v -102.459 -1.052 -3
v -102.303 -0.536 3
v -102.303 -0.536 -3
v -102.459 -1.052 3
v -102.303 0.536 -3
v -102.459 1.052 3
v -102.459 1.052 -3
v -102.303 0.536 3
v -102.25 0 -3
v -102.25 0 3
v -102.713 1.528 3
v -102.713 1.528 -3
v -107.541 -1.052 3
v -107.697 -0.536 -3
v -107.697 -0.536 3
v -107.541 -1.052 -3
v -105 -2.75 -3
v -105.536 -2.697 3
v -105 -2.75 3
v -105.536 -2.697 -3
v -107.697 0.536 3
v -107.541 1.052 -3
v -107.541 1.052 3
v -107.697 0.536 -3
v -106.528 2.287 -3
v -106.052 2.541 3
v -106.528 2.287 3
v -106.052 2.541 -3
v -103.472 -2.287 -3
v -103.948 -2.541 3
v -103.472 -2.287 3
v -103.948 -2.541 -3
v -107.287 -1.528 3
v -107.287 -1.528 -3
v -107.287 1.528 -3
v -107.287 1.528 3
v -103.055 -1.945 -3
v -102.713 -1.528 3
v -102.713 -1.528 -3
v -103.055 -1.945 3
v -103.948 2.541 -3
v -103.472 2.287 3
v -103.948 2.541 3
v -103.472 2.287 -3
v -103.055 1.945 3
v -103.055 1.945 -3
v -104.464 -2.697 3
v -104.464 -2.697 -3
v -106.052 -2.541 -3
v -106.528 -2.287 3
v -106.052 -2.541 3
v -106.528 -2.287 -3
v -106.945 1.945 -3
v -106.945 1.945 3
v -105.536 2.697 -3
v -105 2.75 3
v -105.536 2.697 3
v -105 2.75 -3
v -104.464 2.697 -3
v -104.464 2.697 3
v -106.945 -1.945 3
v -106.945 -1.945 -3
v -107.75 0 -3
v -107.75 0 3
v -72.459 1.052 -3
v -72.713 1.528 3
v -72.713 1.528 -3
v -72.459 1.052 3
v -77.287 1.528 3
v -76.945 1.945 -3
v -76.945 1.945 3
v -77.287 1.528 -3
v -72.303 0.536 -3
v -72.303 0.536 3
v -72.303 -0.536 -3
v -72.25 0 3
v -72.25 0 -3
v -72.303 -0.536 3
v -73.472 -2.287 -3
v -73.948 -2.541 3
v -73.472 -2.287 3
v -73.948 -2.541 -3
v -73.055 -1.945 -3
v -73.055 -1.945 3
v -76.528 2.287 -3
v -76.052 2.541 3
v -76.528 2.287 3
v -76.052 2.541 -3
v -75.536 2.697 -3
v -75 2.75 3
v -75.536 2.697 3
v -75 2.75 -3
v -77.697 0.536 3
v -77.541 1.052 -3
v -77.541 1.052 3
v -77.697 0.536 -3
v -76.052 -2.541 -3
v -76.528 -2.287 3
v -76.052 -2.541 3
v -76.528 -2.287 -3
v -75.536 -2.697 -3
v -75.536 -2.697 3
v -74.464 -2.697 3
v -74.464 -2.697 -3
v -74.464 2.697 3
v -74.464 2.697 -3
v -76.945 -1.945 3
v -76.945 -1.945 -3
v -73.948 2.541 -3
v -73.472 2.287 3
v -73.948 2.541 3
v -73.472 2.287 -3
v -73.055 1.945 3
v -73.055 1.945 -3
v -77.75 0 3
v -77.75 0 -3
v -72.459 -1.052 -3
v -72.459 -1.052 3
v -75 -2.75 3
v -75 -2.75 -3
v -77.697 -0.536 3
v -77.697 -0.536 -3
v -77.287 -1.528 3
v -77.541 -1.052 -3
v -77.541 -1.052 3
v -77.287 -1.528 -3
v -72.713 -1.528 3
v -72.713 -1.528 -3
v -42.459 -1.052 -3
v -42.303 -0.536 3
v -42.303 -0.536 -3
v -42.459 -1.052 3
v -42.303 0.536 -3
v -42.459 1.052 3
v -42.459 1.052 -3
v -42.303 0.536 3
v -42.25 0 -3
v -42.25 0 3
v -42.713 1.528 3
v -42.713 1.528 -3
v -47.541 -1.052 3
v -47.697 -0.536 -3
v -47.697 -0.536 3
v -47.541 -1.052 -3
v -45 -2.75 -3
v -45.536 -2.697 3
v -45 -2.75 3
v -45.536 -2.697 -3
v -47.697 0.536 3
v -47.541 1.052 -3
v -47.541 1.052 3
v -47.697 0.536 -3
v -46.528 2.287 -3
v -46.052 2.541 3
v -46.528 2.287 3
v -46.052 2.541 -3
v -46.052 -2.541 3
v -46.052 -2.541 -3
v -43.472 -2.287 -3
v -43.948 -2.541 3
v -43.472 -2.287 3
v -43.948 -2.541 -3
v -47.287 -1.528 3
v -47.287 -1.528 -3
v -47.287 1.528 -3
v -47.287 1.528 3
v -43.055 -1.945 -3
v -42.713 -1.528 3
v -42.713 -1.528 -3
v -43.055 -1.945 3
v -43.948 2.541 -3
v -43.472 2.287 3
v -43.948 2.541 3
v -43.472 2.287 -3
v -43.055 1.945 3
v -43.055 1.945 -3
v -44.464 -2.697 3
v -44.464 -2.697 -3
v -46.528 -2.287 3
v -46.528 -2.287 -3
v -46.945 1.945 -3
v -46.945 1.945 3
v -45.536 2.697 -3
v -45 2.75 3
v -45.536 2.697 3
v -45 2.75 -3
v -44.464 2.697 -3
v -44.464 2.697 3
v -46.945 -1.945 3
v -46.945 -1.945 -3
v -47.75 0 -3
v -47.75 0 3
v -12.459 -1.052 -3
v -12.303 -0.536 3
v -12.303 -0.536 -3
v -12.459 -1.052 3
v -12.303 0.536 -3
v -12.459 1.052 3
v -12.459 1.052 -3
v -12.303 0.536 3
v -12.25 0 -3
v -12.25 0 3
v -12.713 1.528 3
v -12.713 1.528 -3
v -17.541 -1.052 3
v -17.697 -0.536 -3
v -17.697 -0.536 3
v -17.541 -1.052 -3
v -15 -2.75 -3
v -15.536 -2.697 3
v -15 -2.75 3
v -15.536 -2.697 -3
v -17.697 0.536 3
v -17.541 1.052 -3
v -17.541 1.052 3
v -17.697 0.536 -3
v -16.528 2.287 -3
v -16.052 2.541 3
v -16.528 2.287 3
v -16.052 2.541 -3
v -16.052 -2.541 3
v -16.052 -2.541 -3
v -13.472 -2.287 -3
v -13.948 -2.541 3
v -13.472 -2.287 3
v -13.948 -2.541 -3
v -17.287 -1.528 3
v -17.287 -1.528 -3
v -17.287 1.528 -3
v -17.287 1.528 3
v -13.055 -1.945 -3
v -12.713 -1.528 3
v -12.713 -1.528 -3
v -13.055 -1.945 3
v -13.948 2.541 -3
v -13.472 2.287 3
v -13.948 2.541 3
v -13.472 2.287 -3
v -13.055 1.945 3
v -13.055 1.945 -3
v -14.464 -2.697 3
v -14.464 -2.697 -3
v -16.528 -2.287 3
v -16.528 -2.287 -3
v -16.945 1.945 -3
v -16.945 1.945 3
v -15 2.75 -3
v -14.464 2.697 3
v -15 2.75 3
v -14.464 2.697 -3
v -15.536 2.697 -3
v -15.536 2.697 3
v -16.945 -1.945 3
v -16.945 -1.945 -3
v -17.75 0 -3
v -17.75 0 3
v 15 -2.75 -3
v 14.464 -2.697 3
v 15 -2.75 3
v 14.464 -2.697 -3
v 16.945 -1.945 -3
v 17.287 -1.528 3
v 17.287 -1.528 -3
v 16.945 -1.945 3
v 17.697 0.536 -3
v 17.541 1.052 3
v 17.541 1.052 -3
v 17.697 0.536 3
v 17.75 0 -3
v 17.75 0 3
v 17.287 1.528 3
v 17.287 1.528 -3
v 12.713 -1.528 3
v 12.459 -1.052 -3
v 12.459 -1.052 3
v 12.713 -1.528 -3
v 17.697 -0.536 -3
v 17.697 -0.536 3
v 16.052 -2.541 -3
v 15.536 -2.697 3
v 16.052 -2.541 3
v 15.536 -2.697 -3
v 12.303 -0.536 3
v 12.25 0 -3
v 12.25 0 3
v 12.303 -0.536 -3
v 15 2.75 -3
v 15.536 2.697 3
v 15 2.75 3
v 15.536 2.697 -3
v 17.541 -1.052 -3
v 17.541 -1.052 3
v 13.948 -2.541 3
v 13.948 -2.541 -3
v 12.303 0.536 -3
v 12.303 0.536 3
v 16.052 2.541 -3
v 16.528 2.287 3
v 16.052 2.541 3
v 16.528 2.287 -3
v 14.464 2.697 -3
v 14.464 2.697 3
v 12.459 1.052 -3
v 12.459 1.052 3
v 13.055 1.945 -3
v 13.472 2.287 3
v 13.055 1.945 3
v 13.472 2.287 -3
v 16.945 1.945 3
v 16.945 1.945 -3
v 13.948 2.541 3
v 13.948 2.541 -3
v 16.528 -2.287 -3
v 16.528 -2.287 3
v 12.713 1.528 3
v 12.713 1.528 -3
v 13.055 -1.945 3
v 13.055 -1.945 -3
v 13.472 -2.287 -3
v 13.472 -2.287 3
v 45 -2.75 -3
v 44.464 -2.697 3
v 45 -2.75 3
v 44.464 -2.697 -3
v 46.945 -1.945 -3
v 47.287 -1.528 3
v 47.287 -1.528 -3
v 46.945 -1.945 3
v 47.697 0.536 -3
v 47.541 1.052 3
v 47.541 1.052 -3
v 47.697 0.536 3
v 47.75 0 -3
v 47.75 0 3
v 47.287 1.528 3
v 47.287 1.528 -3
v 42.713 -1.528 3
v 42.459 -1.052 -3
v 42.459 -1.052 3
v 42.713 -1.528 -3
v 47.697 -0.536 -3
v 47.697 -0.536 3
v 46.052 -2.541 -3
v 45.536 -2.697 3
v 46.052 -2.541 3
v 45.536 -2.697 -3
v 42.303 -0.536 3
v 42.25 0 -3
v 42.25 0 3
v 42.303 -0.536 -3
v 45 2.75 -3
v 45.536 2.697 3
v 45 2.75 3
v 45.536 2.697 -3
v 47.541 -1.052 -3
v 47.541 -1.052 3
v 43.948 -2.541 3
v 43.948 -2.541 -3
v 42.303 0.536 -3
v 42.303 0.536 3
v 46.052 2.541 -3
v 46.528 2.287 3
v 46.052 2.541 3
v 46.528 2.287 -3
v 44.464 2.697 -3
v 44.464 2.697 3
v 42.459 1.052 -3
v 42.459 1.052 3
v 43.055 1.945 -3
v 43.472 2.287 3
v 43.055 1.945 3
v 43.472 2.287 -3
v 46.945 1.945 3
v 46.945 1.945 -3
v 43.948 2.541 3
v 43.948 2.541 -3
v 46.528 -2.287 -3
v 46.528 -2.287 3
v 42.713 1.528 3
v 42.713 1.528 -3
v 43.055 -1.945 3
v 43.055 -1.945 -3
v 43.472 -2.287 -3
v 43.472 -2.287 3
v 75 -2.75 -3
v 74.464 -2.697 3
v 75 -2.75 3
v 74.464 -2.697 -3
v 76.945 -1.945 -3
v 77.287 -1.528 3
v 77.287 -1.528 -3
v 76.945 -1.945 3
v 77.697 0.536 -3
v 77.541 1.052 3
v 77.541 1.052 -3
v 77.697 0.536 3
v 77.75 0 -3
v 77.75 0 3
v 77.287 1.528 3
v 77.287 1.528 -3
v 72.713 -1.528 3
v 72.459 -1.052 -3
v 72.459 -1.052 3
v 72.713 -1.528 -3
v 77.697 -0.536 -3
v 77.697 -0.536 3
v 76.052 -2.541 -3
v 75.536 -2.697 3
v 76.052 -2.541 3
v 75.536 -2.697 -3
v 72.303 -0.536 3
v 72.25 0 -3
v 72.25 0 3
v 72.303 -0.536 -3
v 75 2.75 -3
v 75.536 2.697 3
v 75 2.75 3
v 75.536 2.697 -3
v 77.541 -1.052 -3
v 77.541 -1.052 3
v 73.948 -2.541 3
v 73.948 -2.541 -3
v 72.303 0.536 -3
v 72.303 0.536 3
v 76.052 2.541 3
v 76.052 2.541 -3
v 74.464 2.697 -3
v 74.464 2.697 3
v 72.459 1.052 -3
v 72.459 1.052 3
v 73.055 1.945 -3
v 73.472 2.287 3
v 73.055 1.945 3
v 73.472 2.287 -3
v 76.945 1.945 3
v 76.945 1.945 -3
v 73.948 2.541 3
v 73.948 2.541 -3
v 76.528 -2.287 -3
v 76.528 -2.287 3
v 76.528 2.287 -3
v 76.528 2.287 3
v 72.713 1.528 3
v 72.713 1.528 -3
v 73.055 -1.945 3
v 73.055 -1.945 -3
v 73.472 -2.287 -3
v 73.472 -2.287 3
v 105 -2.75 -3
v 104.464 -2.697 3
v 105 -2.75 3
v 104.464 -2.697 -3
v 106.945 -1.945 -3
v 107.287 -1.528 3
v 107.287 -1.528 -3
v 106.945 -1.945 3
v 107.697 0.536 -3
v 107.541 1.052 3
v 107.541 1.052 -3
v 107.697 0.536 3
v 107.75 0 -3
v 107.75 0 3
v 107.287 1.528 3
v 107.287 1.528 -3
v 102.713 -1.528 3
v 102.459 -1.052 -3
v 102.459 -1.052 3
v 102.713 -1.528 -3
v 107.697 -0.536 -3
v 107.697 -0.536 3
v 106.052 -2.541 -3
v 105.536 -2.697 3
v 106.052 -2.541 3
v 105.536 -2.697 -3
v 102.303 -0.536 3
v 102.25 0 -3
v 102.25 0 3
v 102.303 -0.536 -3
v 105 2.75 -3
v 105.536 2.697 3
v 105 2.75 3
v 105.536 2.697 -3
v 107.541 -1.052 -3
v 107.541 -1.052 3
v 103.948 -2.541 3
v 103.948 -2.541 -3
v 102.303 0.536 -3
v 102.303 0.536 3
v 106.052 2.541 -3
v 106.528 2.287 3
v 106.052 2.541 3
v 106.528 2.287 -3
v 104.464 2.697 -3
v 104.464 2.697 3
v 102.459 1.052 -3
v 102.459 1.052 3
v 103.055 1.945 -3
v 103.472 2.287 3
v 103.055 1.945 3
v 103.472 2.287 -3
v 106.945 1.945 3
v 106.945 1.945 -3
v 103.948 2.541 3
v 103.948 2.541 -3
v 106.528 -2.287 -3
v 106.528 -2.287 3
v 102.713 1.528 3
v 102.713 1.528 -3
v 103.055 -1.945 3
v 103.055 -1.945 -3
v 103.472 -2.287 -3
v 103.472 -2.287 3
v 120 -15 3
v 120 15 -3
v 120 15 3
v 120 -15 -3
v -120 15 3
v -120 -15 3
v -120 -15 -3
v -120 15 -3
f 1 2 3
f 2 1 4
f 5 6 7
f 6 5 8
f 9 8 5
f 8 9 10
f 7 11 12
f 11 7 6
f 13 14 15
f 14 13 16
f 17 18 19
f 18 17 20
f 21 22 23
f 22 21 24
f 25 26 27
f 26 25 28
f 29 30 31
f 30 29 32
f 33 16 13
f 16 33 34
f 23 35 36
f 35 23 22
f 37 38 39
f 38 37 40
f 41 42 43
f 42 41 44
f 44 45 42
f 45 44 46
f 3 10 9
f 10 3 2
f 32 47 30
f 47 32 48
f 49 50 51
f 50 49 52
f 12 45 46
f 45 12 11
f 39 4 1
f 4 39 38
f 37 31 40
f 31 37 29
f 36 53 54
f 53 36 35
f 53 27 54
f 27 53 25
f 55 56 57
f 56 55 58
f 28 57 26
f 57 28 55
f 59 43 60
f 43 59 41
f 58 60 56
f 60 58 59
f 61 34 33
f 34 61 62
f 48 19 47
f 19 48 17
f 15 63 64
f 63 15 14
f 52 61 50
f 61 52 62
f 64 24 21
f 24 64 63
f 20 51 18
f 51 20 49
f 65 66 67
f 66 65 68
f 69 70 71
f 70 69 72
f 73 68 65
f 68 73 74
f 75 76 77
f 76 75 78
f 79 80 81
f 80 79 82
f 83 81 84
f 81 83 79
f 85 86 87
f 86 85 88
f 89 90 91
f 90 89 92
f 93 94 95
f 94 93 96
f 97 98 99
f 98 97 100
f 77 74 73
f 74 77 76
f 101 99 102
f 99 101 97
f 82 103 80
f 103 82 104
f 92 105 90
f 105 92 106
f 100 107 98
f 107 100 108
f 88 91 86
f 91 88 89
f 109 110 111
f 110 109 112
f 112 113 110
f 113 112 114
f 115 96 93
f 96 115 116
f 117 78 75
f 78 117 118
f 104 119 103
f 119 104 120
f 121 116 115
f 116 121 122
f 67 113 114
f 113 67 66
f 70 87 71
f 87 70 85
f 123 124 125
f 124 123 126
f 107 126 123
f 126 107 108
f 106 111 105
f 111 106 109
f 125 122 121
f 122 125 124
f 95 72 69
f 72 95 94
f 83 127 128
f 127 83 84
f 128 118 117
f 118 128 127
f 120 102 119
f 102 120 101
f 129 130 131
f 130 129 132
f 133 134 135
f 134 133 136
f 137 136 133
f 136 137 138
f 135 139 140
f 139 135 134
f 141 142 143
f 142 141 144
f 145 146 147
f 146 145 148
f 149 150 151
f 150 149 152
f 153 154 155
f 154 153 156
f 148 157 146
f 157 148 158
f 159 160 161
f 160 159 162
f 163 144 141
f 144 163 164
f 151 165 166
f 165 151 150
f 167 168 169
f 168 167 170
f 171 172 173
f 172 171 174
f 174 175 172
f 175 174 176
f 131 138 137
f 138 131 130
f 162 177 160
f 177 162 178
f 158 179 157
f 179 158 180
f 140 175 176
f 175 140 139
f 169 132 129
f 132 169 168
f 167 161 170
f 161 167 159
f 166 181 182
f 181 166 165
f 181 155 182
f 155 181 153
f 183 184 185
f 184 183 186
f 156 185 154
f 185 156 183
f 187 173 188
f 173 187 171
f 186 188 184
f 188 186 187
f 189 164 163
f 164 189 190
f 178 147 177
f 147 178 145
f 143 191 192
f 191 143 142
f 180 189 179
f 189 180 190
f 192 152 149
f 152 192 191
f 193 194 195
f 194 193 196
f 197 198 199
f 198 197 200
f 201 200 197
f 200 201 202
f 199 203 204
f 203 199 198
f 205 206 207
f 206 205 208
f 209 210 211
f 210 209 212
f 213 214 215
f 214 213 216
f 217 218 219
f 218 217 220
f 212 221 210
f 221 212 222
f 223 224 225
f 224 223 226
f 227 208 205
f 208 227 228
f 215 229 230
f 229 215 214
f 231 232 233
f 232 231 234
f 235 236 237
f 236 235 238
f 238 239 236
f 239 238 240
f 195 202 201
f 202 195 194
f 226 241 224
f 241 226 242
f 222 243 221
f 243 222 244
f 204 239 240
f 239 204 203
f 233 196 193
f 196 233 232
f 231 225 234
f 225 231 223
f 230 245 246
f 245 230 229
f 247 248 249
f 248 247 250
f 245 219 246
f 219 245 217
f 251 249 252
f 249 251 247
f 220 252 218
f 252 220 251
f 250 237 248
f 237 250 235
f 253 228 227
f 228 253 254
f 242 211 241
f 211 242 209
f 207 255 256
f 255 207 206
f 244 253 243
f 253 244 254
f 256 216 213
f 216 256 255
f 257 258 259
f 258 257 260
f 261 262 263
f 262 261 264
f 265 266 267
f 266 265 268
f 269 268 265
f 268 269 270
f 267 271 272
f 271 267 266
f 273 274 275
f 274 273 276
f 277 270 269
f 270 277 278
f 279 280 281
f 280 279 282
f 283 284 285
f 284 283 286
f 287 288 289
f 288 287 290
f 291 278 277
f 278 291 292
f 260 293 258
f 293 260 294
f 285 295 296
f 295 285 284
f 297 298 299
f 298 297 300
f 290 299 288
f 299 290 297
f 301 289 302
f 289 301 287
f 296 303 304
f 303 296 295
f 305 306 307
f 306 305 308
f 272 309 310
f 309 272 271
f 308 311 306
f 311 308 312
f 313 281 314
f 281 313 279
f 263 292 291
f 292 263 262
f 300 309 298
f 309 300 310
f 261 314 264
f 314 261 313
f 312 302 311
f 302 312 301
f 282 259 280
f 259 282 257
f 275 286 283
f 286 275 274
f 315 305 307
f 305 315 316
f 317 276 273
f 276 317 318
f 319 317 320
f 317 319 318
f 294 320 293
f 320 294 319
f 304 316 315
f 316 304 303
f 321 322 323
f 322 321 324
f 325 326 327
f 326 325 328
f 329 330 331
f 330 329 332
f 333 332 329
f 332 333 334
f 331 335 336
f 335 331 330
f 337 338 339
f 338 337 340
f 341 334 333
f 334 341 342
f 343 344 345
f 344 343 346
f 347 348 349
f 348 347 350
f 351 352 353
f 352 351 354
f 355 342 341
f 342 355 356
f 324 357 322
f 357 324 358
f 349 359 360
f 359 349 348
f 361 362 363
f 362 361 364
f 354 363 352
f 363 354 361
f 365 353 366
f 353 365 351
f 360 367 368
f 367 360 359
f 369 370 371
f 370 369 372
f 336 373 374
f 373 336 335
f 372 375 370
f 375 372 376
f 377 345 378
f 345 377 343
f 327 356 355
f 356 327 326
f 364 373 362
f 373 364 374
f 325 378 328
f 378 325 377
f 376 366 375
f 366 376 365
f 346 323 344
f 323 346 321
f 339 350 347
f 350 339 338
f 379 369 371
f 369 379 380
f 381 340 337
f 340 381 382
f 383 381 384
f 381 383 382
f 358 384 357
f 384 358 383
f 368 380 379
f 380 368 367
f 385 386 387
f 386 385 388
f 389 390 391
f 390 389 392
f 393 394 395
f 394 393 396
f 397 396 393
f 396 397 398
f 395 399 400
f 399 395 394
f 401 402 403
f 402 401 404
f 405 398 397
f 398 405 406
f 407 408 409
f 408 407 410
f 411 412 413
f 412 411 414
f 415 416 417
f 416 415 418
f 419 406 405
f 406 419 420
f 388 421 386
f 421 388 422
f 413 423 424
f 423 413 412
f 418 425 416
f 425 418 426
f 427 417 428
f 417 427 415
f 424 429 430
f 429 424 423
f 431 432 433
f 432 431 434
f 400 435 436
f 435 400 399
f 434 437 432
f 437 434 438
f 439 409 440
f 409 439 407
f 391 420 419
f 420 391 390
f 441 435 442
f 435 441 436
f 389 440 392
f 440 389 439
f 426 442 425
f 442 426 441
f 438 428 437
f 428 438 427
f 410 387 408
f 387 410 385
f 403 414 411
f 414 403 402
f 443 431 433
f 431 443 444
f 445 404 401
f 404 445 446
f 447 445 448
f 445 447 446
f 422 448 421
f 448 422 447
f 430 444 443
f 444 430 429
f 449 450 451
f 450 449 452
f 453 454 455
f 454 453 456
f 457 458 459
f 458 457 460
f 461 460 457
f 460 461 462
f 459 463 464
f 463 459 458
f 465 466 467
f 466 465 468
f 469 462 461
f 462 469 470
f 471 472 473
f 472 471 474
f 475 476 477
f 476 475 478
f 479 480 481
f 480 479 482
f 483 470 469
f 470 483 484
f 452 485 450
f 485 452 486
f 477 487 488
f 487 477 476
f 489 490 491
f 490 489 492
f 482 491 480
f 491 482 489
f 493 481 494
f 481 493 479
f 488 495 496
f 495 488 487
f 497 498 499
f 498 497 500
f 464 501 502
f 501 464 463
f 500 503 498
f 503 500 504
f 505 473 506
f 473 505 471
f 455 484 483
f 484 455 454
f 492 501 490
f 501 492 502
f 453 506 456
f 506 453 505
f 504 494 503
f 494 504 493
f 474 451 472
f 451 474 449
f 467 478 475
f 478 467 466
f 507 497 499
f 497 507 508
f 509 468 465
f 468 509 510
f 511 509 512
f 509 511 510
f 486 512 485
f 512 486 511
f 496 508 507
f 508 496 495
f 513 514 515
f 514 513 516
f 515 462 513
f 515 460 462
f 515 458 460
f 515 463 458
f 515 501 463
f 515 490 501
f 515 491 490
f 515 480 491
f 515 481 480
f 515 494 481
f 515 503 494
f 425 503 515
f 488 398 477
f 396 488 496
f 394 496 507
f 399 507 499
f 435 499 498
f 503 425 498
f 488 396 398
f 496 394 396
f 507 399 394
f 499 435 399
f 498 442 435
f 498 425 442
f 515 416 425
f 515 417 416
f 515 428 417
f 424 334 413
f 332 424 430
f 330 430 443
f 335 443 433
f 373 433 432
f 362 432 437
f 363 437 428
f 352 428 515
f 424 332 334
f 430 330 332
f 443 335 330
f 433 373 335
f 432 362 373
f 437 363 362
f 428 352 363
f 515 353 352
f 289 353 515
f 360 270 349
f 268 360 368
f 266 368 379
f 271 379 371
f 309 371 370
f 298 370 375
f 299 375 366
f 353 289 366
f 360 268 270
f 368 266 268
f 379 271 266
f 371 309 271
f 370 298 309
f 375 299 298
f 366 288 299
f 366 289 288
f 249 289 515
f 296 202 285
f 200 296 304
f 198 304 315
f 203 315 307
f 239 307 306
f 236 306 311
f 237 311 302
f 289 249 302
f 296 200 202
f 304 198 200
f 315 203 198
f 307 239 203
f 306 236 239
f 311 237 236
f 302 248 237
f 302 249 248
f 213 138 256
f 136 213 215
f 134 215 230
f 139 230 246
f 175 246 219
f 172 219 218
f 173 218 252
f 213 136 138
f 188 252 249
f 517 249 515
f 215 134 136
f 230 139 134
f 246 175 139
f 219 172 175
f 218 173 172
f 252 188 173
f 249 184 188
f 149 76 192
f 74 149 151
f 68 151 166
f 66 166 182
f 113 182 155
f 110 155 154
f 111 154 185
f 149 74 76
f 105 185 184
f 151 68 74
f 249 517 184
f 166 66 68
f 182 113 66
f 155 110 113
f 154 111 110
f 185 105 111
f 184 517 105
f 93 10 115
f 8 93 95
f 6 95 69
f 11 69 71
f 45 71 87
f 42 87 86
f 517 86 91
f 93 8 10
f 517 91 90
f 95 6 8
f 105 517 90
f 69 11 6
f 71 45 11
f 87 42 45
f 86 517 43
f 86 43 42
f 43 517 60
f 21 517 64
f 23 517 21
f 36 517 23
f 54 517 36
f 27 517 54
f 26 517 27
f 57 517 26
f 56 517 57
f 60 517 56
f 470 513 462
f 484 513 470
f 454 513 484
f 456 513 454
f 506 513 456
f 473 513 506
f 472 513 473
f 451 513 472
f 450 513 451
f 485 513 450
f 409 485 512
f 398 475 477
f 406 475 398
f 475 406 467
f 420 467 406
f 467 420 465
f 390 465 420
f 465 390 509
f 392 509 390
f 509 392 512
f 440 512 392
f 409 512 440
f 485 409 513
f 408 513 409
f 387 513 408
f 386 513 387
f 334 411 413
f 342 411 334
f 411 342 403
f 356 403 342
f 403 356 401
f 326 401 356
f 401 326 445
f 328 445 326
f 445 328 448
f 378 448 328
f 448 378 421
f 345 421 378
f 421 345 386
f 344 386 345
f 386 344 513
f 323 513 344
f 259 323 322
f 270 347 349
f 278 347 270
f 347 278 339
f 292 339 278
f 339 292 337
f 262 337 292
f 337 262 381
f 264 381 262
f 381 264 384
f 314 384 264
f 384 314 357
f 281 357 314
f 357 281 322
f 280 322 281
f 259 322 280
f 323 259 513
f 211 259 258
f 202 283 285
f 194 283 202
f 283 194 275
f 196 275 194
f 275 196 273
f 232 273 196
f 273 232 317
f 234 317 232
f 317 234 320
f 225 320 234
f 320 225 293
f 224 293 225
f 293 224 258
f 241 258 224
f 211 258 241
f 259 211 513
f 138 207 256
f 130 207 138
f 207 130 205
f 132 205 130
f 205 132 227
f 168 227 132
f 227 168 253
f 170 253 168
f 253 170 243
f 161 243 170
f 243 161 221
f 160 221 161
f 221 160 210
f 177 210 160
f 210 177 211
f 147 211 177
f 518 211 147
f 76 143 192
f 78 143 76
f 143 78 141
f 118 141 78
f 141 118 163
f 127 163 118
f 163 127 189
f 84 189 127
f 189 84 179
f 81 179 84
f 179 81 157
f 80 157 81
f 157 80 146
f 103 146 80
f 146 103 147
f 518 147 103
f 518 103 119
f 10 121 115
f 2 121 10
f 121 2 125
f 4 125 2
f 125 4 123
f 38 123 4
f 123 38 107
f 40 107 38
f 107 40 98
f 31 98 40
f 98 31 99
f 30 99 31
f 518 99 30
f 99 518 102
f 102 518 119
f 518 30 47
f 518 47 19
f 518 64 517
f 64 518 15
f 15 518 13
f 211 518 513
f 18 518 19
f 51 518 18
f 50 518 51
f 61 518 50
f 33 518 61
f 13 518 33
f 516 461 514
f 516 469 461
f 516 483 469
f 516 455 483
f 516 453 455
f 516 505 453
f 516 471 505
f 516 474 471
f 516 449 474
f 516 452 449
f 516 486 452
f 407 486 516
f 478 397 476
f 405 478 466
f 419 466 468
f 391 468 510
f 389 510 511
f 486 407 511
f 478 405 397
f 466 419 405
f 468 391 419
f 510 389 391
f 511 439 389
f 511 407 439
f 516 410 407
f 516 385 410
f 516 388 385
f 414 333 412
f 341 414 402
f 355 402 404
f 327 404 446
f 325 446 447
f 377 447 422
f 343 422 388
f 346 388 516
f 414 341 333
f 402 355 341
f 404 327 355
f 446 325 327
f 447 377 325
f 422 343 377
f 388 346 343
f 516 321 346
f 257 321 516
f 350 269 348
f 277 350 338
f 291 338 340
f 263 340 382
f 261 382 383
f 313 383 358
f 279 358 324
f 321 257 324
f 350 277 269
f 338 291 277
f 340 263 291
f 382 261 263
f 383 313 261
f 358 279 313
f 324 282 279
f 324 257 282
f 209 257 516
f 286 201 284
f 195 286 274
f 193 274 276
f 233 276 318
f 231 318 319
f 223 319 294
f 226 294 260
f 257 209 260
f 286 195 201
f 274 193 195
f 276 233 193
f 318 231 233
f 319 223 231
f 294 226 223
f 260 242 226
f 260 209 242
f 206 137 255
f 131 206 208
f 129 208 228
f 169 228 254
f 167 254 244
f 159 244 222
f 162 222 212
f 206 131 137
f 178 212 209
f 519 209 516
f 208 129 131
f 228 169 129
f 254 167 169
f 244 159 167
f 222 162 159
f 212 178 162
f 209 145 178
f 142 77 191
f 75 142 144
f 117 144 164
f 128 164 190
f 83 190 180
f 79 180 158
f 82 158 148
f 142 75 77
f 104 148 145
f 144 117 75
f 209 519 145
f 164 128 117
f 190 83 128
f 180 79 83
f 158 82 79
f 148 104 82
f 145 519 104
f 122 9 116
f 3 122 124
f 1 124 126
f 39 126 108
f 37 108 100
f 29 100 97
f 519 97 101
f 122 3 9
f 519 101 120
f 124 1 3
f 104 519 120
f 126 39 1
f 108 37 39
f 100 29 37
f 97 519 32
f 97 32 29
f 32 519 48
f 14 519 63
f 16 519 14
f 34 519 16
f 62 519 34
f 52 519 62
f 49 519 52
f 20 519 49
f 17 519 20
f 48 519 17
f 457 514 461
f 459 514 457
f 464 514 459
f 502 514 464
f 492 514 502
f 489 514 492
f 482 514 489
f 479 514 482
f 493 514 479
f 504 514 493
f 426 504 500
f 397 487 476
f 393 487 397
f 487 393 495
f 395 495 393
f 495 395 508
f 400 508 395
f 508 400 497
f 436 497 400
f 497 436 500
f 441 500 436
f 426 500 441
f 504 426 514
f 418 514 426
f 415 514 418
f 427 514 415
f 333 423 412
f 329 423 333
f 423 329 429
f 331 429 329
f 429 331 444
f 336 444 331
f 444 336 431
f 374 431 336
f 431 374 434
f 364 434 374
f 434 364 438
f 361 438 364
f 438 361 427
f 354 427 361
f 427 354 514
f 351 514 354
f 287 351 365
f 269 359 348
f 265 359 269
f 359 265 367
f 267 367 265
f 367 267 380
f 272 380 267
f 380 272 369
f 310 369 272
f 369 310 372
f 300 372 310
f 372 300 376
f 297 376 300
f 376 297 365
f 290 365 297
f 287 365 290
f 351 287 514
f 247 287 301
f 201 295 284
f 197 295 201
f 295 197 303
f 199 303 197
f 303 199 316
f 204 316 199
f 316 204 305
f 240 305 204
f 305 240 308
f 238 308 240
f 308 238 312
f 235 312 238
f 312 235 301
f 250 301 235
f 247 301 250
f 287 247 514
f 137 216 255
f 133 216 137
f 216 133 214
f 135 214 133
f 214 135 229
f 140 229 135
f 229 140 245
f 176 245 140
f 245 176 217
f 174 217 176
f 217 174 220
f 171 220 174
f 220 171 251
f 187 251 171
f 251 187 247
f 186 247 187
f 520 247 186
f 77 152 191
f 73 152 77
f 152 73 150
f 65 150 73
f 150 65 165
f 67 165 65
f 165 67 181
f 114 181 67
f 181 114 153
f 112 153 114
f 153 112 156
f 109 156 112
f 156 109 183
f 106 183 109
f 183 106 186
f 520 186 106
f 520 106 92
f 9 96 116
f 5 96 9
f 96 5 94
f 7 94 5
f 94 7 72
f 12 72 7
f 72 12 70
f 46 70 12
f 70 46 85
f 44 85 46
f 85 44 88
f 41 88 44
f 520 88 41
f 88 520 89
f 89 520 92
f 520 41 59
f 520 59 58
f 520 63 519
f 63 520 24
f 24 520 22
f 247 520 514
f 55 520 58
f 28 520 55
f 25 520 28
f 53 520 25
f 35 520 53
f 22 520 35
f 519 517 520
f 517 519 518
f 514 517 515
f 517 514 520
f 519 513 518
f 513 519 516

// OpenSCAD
$fn = 32;

// ----------------------------------------------------------------------
// Hole bar, 8 x Ø5.5
// skip layout, 15 mm edge offset
// ----------------------------------------------------------------------

// --- parameters (mm) ---
bar_w = 30;       // bar width (Y)
bar_t = 6;        // bar thickness (Z)
holes = 8;        // holes per row
hole_d = 5.5;     // hole diameter
edge = 15;        // offset from the bar end to the first hole
grid_pitch = 15;  // grid the bar was laid out on

// --- derived feature positions (mm) ---
pitch = grid_pitch * 2;       // = 30   holes sit every other grid slot
span = (holes - 1) * pitch;   // = 210   distance between the end holes
bar_l = span + 2 * edge;      // = 240   overall bar length
start_x = -bar_l / 2 + edge;  // = -105   X of the first hole
feature_centers = [
  [start_x + 0 * pitch, 0],
  [start_x + 1 * pitch, 0],
  [start_x + 2 * pitch, 0],
  [start_x + 3 * pitch, 0],
  [start_x + 4 * pitch, 0],
  [start_x + 5 * pitch, 0],
  [start_x + 6 * pitch, 0],
  [start_x + 7 * pitch, 0]
];   // hole centres of the first row

// bar with one row of holes, drilled from feature_centers
difference() {
  translate([-bar_l / 2, -bar_w / 2, -bar_t / 2]) cube([bar_l, bar_w, bar_t]);
  for (centre = feature_centers)
    translate([centre[0], centre[1], 0])
      cylinder(d = hole_d, h = bar_t + 2, center = true);
}
